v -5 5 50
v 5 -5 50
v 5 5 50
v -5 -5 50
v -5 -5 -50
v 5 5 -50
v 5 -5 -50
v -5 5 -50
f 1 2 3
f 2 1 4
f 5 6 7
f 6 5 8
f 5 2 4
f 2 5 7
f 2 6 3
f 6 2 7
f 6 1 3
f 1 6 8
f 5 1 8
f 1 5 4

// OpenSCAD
$fn = 64;

// Simple 10x10mm aluminium extrusion (square bar), 100mm long.
// Length along Z, centered at origin.
module aluminium_extrusion_1010(len=100, size=10) {
    cube([size, size, len], center=true);
}

aluminium_extrusion_1010(len=100, size=10);
